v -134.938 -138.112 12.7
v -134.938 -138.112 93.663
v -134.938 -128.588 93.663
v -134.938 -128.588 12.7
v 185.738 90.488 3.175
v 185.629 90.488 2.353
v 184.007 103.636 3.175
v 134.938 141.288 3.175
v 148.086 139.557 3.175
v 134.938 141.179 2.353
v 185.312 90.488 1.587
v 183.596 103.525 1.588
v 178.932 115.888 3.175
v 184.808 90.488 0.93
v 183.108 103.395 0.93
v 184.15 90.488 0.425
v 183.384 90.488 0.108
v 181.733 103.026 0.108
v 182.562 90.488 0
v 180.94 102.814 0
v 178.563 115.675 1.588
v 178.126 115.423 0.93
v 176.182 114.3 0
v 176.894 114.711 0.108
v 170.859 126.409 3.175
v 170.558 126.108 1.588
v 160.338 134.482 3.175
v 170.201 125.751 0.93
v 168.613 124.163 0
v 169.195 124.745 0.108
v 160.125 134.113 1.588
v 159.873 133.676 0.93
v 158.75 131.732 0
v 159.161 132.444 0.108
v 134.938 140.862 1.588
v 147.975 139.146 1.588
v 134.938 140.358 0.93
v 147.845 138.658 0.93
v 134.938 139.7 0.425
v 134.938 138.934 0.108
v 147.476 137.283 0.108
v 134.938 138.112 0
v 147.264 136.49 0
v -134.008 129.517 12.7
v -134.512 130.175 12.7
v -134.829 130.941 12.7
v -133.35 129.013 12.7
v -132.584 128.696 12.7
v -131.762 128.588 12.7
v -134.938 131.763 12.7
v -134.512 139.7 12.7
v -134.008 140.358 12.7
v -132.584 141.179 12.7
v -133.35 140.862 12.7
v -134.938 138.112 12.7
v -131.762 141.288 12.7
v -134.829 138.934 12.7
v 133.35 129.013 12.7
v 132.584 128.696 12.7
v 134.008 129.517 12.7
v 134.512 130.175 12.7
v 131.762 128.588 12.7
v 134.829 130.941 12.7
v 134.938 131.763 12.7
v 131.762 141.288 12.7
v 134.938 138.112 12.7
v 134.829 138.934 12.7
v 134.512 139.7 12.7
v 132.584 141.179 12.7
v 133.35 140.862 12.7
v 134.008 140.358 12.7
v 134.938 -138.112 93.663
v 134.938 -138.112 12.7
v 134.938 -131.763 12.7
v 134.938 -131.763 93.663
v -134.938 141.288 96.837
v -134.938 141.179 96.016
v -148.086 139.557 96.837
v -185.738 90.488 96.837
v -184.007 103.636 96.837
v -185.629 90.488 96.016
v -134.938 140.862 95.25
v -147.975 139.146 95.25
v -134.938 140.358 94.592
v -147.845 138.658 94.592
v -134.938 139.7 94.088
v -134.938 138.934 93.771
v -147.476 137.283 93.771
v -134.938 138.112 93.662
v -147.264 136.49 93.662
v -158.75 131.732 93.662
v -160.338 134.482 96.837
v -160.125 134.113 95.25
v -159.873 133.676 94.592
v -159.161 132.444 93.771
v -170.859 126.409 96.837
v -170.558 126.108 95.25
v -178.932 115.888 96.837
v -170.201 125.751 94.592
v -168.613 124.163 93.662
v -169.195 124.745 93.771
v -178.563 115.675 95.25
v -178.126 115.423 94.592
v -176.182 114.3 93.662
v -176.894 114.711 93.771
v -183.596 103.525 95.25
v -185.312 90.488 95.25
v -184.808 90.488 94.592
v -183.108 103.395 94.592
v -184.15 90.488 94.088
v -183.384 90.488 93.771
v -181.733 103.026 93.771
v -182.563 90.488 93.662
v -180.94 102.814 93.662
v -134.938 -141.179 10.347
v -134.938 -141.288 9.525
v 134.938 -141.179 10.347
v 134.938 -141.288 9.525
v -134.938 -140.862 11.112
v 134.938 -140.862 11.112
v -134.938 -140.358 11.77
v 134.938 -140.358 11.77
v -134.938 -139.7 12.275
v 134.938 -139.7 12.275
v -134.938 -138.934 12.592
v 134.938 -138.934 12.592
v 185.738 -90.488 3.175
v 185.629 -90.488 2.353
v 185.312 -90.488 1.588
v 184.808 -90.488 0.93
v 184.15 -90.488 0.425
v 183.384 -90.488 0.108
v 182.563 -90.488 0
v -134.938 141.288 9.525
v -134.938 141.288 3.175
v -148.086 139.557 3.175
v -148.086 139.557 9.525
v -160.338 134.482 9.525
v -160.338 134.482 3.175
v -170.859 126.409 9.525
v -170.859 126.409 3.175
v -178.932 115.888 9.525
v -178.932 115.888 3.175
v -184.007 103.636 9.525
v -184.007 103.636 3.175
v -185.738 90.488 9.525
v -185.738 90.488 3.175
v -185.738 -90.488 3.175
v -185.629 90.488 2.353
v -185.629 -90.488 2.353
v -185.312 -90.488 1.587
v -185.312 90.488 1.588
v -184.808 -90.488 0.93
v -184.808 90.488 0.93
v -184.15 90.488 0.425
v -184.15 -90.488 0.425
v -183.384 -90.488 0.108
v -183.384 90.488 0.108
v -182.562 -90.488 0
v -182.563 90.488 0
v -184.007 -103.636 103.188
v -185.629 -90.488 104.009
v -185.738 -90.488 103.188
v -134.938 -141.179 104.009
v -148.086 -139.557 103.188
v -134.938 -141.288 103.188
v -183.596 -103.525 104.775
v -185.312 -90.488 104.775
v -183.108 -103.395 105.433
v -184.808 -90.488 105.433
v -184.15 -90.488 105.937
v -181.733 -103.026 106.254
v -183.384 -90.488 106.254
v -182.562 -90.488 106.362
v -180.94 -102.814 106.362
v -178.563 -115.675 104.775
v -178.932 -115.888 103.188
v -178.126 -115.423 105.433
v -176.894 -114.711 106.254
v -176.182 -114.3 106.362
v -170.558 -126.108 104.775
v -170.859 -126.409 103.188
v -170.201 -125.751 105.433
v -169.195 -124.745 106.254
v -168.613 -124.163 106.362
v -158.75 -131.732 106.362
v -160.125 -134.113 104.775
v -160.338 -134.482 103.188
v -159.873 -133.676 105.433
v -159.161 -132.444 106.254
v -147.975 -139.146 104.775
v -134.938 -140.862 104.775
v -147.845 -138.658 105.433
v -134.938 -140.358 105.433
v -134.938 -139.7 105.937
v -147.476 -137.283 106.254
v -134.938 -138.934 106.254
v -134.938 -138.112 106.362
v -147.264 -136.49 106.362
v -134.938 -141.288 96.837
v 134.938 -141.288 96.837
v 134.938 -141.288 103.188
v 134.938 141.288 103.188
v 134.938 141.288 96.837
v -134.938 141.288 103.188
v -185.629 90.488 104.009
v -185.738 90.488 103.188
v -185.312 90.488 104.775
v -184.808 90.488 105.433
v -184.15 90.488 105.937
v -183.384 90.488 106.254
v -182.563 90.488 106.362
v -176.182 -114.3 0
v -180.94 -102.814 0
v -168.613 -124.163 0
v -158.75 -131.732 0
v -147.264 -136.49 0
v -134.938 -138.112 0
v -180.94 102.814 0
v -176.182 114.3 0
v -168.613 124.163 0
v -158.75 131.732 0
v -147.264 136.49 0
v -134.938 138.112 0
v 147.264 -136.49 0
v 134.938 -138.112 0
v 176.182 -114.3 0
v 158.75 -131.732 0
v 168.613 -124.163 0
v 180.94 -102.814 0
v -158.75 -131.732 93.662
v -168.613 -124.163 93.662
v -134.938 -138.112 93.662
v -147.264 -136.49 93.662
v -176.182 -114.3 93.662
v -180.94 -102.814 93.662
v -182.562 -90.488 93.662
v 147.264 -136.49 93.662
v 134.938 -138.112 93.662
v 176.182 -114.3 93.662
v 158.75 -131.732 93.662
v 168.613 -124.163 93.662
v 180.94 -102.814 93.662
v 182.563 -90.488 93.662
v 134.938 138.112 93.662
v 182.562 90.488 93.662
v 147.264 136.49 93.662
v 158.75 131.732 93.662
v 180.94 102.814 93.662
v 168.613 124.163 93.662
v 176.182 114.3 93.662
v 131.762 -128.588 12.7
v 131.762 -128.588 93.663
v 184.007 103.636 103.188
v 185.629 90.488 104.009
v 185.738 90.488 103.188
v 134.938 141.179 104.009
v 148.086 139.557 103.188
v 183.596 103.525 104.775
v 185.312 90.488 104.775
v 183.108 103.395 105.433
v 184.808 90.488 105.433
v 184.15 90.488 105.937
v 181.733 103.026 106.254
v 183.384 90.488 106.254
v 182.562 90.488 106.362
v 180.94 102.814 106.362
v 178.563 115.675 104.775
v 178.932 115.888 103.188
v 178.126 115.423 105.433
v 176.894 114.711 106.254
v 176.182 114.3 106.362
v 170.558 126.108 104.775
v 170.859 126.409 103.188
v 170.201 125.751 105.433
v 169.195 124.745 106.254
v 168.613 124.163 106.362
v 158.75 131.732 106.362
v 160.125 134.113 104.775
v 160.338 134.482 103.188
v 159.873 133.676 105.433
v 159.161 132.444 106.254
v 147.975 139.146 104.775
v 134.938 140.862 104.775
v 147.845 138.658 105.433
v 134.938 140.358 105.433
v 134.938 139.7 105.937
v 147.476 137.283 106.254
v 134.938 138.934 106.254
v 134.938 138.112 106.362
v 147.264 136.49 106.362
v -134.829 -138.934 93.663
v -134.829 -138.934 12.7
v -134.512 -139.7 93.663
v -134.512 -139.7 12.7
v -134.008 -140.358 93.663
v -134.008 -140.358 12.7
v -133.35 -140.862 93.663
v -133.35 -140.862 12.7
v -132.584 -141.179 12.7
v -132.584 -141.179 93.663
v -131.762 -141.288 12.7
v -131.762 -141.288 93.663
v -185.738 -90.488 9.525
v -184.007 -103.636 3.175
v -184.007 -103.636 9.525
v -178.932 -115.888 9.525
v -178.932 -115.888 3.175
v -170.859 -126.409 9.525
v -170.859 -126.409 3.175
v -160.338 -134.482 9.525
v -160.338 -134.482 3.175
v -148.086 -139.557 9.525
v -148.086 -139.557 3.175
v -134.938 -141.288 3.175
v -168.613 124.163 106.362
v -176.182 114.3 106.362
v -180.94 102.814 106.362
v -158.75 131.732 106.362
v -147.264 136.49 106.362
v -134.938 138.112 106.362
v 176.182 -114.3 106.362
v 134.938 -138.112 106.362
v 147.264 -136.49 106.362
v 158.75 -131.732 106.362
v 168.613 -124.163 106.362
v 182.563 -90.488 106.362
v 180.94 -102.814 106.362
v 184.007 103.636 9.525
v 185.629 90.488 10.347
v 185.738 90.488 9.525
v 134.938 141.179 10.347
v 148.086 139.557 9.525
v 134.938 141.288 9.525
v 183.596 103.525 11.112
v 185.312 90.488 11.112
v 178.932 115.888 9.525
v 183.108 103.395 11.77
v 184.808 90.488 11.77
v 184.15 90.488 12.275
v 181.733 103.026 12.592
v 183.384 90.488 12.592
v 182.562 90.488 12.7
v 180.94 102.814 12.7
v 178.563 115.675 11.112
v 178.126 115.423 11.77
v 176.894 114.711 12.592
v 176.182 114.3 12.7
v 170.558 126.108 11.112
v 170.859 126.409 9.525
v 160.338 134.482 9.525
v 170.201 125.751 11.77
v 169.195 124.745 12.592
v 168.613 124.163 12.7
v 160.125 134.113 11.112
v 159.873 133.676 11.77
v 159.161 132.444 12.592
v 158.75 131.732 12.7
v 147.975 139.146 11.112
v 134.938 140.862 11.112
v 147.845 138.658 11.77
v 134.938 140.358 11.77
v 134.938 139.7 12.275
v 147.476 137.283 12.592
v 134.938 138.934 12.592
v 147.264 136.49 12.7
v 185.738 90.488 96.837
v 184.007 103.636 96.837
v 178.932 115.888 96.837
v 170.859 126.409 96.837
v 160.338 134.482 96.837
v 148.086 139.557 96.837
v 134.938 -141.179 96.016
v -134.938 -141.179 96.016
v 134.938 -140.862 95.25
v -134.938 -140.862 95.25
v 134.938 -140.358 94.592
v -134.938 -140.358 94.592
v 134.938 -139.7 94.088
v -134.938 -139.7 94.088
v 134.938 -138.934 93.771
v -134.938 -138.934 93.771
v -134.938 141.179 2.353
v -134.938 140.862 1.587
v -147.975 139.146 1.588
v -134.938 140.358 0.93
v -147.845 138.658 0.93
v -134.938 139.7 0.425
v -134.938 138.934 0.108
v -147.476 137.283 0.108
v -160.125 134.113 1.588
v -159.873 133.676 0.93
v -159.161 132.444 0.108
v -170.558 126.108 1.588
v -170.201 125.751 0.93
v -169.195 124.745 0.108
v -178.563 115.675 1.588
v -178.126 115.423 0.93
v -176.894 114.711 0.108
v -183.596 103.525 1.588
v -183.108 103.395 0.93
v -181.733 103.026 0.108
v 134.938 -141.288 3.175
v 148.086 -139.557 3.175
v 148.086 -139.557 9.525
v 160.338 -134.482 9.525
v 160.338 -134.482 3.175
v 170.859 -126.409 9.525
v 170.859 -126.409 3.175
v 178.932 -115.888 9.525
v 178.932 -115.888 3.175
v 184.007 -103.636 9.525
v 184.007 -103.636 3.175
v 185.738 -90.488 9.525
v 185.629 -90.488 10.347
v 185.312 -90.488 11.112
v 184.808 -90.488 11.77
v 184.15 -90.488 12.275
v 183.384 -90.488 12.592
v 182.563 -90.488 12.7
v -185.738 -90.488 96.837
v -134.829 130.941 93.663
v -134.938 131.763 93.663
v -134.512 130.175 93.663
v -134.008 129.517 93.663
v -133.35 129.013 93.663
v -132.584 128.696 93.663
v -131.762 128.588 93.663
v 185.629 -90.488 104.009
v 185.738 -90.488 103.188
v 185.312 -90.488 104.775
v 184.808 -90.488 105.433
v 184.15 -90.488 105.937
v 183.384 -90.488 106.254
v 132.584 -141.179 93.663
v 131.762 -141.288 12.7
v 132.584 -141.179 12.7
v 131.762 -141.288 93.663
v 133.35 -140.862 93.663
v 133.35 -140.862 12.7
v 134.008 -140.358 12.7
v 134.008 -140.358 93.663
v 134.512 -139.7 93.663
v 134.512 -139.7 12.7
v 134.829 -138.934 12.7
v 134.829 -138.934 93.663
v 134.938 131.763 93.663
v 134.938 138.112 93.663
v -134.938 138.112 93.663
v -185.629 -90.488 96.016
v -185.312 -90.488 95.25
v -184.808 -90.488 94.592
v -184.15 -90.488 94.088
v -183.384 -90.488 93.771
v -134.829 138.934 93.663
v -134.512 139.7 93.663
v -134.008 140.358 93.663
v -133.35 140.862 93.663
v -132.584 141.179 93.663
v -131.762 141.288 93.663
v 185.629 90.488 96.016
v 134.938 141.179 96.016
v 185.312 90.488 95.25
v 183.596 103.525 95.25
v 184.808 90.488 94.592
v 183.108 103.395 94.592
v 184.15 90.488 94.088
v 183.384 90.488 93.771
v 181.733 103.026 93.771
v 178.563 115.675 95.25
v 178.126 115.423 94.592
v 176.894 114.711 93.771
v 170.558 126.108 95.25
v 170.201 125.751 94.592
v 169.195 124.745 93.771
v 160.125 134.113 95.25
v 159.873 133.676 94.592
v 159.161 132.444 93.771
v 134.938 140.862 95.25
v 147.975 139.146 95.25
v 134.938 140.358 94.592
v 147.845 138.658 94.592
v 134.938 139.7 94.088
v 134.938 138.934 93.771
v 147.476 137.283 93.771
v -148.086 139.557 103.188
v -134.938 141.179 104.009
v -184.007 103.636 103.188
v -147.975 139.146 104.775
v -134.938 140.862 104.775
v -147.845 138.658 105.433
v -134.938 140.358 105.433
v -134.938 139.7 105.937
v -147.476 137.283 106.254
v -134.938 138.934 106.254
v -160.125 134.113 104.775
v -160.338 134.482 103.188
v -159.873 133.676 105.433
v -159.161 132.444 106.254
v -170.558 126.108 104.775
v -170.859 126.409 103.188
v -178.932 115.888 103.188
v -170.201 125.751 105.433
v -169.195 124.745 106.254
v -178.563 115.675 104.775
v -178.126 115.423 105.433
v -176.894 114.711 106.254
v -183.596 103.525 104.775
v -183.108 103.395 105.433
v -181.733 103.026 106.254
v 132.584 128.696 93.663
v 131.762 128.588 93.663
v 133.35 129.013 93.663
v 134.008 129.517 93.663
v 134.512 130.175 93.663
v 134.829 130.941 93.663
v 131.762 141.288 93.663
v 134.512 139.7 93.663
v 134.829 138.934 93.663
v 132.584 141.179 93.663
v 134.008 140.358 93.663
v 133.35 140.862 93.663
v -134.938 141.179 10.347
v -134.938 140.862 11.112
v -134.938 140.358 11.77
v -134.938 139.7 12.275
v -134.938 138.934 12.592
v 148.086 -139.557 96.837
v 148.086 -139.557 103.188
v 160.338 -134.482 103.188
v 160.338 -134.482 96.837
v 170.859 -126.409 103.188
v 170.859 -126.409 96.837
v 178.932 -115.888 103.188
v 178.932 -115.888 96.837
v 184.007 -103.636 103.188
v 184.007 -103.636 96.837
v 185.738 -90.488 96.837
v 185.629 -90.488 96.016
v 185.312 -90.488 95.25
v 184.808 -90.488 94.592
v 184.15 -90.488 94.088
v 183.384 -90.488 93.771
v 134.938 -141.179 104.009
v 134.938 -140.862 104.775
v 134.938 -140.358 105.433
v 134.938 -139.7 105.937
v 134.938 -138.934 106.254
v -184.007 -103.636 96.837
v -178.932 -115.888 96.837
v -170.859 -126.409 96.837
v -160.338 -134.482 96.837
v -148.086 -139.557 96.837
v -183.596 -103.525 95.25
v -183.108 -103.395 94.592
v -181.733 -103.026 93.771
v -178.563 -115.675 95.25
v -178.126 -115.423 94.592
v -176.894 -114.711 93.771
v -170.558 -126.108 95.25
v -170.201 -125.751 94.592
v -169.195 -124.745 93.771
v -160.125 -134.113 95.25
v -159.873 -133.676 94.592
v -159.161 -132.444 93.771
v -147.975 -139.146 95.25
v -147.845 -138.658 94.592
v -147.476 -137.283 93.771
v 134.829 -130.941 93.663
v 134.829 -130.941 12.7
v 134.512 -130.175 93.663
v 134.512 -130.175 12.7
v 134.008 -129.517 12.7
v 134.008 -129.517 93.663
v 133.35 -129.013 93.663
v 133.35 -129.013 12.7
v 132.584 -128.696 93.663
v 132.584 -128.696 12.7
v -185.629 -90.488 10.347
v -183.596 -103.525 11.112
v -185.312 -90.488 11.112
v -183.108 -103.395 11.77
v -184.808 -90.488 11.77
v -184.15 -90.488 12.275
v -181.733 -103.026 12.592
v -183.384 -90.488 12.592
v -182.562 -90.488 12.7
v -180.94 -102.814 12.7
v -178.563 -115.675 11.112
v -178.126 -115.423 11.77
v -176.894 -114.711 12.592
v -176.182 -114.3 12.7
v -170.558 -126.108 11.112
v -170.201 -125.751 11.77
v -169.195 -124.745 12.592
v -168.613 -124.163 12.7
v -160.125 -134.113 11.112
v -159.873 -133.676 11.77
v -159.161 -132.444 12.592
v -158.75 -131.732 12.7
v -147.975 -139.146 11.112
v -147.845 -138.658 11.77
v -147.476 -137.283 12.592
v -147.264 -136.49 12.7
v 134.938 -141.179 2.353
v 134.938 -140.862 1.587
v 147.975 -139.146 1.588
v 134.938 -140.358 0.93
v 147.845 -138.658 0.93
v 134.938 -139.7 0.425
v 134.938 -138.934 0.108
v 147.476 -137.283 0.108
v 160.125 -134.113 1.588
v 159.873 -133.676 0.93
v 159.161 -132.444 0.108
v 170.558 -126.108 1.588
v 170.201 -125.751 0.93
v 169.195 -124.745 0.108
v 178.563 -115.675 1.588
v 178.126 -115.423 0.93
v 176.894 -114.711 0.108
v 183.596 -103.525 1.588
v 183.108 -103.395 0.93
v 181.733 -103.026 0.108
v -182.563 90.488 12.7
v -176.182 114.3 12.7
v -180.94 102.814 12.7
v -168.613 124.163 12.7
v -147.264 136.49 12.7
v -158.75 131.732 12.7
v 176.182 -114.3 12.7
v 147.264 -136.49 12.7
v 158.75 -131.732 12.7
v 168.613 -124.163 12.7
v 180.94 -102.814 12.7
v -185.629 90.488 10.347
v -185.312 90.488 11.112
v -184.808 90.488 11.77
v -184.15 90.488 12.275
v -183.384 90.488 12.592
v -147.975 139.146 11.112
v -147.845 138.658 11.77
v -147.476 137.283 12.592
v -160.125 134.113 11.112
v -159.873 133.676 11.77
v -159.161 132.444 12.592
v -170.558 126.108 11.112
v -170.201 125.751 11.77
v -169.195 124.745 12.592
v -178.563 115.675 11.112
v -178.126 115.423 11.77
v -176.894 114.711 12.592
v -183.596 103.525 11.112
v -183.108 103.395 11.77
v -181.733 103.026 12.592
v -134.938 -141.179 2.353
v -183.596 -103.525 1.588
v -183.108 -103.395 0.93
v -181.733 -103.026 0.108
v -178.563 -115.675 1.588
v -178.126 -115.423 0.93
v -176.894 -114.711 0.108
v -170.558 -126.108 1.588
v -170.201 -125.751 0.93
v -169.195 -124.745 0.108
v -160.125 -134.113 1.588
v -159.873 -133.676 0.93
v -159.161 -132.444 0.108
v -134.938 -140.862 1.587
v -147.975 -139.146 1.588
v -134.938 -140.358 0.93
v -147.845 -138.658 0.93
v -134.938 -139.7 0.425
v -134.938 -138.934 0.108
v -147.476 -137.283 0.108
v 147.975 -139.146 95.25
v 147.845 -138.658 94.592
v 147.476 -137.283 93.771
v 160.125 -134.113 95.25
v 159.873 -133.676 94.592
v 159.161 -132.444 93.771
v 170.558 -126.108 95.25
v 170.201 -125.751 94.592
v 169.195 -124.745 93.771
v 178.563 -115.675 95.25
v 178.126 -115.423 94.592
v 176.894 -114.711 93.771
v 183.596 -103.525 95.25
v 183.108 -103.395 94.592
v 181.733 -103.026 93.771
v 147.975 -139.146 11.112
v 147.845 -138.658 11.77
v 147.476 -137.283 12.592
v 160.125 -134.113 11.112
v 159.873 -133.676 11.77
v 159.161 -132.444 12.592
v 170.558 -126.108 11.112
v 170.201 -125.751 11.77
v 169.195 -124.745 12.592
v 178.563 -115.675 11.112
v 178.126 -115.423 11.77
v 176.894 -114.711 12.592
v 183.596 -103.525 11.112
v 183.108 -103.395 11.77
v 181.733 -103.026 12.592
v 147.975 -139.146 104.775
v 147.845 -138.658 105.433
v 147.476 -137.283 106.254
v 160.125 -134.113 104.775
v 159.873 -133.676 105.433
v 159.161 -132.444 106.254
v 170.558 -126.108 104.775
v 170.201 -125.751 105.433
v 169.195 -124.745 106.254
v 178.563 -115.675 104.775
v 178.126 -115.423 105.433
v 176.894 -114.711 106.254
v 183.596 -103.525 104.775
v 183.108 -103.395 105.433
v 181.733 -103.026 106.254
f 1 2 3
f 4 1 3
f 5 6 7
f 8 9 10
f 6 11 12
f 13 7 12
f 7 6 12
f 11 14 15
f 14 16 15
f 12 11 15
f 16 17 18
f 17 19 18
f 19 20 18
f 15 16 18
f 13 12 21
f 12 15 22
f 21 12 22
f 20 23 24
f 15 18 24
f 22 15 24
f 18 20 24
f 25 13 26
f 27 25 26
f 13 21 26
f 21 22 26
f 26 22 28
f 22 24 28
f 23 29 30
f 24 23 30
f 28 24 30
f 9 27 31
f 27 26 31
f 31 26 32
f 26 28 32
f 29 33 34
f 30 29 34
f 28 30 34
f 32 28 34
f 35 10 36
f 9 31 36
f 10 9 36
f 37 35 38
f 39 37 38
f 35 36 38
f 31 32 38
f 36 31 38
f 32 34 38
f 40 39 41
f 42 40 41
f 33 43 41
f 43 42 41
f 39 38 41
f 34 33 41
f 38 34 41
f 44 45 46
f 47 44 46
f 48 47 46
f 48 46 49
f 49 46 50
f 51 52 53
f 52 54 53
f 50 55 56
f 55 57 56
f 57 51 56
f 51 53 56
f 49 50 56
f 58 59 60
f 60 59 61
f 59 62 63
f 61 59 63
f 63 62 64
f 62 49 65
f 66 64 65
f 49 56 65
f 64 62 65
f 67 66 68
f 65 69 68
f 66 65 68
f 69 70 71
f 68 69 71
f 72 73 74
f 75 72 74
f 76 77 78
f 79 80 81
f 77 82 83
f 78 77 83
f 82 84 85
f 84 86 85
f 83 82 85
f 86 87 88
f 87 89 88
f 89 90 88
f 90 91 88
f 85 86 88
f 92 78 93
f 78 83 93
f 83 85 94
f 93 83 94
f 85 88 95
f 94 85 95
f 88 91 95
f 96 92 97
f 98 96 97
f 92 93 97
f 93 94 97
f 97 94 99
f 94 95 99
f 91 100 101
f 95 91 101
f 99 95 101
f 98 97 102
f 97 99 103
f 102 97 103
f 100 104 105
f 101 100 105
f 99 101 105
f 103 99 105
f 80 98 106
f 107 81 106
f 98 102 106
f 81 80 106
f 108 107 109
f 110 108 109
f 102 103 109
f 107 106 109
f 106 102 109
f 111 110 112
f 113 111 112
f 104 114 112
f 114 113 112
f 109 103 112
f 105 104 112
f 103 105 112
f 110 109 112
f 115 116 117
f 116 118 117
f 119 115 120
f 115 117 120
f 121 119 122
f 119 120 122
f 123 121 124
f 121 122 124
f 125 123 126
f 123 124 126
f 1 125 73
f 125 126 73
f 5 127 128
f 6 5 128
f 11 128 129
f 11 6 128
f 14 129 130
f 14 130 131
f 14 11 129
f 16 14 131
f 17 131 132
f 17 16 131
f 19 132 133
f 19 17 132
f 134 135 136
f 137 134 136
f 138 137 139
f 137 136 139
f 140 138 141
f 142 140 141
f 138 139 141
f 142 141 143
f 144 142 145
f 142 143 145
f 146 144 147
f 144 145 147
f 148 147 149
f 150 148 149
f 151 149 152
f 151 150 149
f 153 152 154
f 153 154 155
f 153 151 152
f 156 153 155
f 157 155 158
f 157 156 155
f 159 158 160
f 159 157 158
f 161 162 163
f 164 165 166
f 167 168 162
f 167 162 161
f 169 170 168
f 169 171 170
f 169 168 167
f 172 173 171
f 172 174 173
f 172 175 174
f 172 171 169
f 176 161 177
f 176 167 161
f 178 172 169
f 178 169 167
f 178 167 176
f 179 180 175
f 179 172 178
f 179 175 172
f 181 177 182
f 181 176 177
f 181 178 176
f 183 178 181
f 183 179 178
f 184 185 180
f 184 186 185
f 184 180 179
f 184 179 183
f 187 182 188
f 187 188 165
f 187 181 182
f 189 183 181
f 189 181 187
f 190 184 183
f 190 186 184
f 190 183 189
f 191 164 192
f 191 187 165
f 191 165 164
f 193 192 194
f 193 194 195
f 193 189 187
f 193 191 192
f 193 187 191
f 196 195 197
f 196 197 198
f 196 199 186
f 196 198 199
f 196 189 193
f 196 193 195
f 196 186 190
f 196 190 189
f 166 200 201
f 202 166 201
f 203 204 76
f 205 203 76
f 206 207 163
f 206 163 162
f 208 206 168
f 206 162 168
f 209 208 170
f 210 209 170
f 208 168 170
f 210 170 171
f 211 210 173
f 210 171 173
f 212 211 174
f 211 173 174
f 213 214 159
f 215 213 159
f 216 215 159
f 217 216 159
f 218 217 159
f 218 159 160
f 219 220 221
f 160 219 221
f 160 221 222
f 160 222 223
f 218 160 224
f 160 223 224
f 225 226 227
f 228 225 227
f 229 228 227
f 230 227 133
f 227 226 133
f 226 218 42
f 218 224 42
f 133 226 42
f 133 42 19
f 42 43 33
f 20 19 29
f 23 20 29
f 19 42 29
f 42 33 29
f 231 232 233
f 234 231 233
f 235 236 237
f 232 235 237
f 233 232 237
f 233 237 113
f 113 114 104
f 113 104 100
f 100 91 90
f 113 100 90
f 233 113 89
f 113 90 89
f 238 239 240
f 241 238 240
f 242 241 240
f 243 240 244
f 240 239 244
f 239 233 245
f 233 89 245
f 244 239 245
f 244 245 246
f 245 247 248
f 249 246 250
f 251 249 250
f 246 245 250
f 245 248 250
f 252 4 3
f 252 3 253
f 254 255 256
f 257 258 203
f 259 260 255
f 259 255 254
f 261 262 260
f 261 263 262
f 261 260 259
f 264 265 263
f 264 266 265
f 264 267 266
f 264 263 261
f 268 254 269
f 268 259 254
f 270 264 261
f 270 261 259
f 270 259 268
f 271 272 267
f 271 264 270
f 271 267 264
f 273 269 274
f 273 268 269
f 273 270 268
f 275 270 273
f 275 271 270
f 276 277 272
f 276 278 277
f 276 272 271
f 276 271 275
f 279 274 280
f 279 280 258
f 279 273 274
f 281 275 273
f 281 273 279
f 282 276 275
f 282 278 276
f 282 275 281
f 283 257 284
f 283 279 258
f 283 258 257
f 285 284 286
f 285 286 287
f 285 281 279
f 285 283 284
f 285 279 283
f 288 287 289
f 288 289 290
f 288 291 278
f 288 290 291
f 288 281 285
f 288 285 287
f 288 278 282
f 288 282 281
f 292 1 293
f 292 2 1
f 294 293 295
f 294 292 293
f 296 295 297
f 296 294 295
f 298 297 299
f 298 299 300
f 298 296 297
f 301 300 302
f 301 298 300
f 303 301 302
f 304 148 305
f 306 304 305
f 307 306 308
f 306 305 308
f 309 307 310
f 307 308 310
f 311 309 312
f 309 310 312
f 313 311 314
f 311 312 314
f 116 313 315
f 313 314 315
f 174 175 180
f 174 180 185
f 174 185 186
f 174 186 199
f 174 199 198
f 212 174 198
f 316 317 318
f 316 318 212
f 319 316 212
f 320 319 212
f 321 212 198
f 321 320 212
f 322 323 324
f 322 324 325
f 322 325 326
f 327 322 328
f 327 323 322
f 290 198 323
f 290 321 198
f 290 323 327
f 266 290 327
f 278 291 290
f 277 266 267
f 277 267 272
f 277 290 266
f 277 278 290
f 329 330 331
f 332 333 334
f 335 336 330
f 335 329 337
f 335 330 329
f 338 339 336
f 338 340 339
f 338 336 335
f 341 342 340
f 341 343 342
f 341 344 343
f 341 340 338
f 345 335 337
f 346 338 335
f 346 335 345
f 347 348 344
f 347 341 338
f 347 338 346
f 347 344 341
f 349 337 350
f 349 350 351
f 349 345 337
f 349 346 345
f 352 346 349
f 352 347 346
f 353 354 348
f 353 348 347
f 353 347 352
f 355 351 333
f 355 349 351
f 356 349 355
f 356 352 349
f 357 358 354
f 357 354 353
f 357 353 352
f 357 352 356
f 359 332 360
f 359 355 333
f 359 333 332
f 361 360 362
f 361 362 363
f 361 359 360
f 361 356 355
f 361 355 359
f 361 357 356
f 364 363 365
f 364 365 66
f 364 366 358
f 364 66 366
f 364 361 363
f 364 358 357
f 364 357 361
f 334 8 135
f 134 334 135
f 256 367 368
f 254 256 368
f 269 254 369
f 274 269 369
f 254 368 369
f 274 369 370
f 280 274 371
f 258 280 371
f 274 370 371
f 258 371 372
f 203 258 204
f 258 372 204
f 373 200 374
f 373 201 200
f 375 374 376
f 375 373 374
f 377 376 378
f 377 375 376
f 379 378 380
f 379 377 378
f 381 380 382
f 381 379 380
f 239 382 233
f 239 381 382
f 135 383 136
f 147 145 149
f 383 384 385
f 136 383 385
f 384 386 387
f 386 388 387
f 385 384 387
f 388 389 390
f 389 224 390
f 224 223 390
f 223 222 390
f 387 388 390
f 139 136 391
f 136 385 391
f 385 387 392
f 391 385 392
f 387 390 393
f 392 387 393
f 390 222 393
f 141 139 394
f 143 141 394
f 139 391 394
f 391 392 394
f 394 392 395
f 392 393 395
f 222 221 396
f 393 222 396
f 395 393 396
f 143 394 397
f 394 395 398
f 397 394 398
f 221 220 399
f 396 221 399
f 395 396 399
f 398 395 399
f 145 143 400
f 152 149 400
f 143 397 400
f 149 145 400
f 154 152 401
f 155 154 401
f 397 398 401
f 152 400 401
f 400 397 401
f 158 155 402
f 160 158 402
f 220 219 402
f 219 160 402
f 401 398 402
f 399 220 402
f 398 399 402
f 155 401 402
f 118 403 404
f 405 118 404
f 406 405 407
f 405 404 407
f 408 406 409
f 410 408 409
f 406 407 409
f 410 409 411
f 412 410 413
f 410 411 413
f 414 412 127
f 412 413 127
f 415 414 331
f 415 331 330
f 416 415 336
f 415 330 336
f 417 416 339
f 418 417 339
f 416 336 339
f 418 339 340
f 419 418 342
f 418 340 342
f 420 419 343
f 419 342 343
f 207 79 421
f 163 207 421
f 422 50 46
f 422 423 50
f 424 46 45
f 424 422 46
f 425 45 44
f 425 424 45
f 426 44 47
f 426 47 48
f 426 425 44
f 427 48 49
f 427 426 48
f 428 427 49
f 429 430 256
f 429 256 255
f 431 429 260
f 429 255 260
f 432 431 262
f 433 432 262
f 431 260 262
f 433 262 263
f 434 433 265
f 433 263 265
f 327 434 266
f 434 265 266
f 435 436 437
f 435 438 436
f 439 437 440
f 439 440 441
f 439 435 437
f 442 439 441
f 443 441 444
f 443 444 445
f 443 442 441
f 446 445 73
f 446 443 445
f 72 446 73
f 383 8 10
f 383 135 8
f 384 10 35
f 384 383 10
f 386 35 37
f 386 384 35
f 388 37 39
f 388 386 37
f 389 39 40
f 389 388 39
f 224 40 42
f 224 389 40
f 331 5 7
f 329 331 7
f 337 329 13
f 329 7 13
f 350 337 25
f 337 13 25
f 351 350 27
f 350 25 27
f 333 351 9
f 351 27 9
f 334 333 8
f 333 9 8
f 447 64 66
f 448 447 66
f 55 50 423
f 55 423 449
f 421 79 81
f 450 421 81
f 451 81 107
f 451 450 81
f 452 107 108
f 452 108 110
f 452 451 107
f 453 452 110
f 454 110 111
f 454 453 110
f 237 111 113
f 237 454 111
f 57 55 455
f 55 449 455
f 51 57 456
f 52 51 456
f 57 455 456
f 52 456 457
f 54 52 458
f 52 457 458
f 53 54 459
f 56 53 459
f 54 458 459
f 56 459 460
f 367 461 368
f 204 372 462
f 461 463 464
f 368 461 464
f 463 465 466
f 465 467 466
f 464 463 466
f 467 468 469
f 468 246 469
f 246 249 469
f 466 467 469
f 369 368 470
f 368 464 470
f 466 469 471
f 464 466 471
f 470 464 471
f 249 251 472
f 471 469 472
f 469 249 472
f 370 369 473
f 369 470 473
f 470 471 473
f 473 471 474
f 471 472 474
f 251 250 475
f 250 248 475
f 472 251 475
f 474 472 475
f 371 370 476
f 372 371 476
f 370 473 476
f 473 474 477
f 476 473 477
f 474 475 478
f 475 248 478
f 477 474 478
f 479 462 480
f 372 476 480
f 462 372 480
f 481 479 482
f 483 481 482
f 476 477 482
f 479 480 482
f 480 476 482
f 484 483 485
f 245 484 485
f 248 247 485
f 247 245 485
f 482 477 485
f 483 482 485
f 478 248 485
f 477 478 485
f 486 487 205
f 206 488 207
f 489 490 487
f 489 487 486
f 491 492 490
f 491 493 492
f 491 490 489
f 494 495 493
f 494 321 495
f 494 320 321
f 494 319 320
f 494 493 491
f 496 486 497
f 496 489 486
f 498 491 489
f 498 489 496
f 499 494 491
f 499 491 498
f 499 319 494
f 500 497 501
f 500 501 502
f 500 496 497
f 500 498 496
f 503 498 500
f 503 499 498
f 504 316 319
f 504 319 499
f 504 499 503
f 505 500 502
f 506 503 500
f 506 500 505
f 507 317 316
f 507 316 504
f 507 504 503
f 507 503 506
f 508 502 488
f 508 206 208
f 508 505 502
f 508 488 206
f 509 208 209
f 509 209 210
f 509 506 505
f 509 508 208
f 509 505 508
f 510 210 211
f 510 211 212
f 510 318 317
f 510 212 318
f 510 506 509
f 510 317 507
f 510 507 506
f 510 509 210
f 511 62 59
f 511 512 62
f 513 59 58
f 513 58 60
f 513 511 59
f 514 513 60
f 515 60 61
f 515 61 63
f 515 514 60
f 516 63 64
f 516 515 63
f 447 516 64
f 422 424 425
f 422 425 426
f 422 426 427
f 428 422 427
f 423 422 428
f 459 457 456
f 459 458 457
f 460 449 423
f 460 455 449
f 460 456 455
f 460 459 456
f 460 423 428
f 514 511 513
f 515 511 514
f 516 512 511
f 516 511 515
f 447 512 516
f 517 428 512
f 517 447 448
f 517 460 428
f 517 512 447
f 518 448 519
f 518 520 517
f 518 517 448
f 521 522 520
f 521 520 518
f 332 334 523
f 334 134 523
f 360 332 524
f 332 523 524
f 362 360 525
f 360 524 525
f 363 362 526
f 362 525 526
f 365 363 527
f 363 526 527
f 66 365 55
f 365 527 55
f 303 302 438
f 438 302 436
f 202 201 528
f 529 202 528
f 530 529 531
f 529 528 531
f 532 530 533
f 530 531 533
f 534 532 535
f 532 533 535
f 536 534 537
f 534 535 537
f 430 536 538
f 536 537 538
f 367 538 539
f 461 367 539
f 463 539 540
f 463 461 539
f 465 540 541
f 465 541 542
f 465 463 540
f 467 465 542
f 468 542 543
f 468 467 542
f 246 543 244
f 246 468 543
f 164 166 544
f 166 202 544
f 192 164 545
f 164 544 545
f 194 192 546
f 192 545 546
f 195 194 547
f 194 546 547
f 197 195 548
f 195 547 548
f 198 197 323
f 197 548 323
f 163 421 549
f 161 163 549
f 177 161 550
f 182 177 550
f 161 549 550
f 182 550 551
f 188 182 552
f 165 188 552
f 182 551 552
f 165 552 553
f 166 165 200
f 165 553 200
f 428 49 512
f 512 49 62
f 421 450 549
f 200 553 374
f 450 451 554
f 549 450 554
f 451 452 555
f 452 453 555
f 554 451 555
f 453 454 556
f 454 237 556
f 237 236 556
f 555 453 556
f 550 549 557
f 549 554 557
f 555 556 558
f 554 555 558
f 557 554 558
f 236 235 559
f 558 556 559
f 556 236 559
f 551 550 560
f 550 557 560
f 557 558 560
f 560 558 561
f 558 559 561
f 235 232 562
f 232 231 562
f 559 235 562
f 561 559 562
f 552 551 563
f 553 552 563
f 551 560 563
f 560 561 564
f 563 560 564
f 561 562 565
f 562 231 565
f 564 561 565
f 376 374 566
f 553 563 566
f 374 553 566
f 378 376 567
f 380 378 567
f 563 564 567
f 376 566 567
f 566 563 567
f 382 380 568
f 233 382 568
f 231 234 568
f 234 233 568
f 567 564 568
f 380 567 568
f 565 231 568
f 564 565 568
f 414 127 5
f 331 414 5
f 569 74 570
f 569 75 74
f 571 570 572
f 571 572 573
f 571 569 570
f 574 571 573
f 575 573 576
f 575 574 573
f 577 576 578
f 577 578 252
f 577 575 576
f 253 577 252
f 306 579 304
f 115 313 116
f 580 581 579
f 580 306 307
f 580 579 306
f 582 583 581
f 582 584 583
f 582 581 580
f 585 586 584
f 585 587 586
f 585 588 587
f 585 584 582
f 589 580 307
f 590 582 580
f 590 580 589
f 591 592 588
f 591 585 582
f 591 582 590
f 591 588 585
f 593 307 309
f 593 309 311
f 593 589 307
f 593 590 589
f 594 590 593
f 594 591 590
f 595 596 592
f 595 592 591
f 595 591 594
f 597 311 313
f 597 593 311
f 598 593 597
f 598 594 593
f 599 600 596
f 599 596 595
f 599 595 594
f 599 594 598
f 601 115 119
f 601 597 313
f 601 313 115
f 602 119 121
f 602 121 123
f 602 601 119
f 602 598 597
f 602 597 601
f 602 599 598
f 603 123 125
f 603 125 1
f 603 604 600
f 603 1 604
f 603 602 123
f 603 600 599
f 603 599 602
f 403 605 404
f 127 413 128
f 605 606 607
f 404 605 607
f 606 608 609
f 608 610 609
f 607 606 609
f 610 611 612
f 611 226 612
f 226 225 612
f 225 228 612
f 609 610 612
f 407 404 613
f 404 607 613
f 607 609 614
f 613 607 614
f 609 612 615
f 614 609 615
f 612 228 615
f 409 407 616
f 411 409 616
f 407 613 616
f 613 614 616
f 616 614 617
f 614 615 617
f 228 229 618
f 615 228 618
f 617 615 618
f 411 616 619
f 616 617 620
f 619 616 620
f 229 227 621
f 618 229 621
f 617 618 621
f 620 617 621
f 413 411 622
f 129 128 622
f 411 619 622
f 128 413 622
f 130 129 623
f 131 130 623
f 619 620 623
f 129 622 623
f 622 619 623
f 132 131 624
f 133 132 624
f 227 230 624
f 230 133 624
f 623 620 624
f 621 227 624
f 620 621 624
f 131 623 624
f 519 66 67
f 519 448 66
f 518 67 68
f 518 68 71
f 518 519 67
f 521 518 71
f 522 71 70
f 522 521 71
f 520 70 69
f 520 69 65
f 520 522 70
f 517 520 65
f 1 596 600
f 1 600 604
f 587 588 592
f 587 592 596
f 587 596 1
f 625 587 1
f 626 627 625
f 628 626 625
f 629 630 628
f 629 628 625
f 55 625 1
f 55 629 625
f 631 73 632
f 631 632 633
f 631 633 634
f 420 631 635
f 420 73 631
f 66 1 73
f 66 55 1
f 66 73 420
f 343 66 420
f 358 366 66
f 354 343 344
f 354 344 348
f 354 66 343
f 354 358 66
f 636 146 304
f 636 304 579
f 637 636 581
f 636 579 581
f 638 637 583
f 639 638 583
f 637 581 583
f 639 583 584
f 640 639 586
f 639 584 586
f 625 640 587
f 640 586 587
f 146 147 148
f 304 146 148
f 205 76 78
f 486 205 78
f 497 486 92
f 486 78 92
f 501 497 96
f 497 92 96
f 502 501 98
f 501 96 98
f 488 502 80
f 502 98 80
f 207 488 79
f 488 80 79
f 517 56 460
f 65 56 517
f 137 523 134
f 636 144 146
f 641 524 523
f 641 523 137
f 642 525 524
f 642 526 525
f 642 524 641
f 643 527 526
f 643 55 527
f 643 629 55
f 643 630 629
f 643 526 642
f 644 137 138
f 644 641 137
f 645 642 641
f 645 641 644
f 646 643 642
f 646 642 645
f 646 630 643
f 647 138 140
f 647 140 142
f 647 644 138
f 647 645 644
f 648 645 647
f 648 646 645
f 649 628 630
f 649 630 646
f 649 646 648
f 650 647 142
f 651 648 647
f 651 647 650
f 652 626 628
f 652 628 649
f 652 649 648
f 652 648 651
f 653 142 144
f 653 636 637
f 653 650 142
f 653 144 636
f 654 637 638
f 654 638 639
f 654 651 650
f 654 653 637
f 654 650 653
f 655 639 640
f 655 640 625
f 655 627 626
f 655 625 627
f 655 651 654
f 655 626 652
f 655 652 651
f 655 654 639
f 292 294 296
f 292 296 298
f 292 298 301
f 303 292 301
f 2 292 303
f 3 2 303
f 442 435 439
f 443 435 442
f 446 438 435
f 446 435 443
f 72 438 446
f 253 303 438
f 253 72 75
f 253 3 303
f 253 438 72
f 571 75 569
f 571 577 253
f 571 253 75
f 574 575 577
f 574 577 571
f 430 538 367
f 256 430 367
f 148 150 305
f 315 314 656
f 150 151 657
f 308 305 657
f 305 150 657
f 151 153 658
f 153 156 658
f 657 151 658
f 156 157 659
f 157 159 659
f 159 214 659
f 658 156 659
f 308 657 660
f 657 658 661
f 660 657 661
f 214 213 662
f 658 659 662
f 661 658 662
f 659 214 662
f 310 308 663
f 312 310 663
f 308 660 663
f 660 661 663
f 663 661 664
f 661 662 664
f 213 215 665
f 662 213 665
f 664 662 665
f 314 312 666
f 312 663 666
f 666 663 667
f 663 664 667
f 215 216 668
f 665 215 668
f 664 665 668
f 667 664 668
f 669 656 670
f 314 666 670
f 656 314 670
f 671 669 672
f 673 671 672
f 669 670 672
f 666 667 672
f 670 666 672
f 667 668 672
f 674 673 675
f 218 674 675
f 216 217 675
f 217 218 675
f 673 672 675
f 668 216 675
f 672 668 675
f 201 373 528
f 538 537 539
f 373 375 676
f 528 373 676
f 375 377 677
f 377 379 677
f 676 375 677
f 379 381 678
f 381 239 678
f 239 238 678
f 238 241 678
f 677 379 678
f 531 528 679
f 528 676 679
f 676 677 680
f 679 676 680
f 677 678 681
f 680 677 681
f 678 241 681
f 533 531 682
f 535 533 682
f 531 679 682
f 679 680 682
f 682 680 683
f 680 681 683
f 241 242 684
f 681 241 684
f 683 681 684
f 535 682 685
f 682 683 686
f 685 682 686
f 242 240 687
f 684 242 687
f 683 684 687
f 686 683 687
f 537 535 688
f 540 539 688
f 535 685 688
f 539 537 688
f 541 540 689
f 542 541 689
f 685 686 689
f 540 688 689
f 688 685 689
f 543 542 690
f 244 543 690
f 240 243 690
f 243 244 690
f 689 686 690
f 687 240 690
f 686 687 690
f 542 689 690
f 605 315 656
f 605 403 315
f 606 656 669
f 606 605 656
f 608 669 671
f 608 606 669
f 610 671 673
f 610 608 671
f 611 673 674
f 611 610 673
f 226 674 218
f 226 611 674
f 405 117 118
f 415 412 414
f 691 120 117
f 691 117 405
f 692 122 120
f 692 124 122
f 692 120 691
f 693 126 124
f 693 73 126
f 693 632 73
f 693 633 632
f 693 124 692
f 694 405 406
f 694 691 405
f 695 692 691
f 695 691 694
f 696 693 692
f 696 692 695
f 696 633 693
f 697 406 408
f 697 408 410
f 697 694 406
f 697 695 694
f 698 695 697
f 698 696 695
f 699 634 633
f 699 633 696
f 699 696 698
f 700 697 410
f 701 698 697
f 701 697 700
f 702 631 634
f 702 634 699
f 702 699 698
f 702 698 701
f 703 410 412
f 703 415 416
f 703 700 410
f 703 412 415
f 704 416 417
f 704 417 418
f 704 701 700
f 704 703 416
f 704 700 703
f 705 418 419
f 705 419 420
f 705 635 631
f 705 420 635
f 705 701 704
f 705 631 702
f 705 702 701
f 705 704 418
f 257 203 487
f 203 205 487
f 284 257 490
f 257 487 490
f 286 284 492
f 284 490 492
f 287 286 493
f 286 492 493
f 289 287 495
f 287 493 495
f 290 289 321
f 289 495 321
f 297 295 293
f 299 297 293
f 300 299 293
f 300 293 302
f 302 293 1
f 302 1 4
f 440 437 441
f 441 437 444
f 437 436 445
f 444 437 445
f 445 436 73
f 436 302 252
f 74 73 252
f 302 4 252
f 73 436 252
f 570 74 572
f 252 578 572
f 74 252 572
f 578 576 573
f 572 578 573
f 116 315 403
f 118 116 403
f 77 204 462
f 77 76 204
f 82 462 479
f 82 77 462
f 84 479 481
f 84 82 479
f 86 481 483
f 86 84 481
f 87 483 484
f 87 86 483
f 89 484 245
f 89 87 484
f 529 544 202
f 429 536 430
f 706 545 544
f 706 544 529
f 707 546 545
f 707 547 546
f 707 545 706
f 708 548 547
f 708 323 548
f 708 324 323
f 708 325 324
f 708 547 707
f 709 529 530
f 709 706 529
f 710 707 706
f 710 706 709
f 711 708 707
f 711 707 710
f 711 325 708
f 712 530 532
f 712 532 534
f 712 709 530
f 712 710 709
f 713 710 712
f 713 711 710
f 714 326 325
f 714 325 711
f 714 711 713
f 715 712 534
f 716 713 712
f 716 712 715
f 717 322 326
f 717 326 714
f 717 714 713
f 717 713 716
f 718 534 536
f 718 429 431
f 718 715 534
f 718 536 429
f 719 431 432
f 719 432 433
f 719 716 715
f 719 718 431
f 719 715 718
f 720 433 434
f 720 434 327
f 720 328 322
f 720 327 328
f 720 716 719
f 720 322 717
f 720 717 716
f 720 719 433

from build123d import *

# Parameters (mm, degrees)
F1_DEPTH = 12.7
F2_W     = 269.875
F2_H     = 12.7
F3_DEPTH = 80.9625
F5_R     = 3.175
F5_2_R   = 3.175
F5_3_R   = 3.175
F5_4_R   = 3.175


with BuildPart() as f1:
    # F0 (on Top) → F1 (new body)
    with BuildSketch(Plane.XY):
        with BuildLine():
            Line((-134.9375, -141.2875), (134.9375, -141.2875))
            ThreePointArc((134.9375, -141.2875), (170.8585244843, -126.4085244843), (185.7375, -90.4875))
            Line((185.7375, -90.4875), (185.7375, 90.4875))
            ThreePointArc((185.7375, 90.4875), (170.8585244843, 126.4085244843), (134.9375, 141.2875))
            Line((134.9375, 141.2875), (-134.9375, 141.2875))
            ThreePointArc((-134.9375, 141.2875), (-170.8585244843, 126.4085244843), (-185.7375, 90.4875))
            Line((-185.7375, 90.4875), (-185.7375, -90.4875))
            ThreePointArc((-185.7375, -90.4875), (-170.8585244843, -126.4085244843), (-134.9375, -141.2875))
        make_face()
    extrude(amount=F1_DEPTH)


with BuildPart() as f3:
    # F2 (on face) → F3 (new body)
    with BuildSketch(Plane.XY.offset(12.7)):
        with Locations((0, 134.9375)):
            Rectangle(F2_W, F2_H)
    extrude(amount=F3_DEPTH)

    # F5#4
    f5_4_edges = [f3.edges().sort_by_distance(p)[0] for p in [
        (134.9375, 141.2875, 53.18125),
        (134.9375, 128.5875, 53.18125),
        (-134.9375, 141.2875, 53.18125),
        (-134.9375, 128.5875, 53.18125),
    ]]
    fillet(f5_4_edges, radius=F5_4_R)


with BuildPart() as f3b:
    # F2 (on face) → F3, piece 2 (new body)
    with BuildSketch(Plane.XY.offset(12.7)):
        with Locations((0, -134.9375)):
            Rectangle(F2_W, F2_H)
    extrude(amount=F3_DEPTH)

    # F5#3
    f5_3_edges = [f3b.edges().sort_by_distance(p)[0] for p in [
        (-134.9375, -141.2875, 53.18125),
        (134.9375, -141.2875, 53.18125),
        (134.9375, -128.5875, 53.18125),
    ]]
    fillet(f5_3_edges, radius=F5_3_R)


with BuildPart() as f4_1:
    # F4: copy of F1
    add(f1.part.moved(Location((0, 0, 93.6625))))

    # F5
    f5_edges = [f4_1.edges().sort_by_distance(p)[0] for p in [
        (0, -141.2875, 106.3625),
        (-170.858524, -126.408524, 93.6625),
    ]]
    fillet(f5_edges, radius=F5_R)


with BuildPart() as f1_1:
    add(f1.part)

    # F5#2
    f5_2_edges = [f1_1.edges().sort_by_distance(p)[0] for p in [
        (0, -141.2875, 0),
        (-170.858524, -126.408524, 12.7),
    ]]
    fillet(f5_2_edges, radius=F5_2_R)


solid = Compound([f3.part, f3b.part, f4_1.part, f1_1.part])
